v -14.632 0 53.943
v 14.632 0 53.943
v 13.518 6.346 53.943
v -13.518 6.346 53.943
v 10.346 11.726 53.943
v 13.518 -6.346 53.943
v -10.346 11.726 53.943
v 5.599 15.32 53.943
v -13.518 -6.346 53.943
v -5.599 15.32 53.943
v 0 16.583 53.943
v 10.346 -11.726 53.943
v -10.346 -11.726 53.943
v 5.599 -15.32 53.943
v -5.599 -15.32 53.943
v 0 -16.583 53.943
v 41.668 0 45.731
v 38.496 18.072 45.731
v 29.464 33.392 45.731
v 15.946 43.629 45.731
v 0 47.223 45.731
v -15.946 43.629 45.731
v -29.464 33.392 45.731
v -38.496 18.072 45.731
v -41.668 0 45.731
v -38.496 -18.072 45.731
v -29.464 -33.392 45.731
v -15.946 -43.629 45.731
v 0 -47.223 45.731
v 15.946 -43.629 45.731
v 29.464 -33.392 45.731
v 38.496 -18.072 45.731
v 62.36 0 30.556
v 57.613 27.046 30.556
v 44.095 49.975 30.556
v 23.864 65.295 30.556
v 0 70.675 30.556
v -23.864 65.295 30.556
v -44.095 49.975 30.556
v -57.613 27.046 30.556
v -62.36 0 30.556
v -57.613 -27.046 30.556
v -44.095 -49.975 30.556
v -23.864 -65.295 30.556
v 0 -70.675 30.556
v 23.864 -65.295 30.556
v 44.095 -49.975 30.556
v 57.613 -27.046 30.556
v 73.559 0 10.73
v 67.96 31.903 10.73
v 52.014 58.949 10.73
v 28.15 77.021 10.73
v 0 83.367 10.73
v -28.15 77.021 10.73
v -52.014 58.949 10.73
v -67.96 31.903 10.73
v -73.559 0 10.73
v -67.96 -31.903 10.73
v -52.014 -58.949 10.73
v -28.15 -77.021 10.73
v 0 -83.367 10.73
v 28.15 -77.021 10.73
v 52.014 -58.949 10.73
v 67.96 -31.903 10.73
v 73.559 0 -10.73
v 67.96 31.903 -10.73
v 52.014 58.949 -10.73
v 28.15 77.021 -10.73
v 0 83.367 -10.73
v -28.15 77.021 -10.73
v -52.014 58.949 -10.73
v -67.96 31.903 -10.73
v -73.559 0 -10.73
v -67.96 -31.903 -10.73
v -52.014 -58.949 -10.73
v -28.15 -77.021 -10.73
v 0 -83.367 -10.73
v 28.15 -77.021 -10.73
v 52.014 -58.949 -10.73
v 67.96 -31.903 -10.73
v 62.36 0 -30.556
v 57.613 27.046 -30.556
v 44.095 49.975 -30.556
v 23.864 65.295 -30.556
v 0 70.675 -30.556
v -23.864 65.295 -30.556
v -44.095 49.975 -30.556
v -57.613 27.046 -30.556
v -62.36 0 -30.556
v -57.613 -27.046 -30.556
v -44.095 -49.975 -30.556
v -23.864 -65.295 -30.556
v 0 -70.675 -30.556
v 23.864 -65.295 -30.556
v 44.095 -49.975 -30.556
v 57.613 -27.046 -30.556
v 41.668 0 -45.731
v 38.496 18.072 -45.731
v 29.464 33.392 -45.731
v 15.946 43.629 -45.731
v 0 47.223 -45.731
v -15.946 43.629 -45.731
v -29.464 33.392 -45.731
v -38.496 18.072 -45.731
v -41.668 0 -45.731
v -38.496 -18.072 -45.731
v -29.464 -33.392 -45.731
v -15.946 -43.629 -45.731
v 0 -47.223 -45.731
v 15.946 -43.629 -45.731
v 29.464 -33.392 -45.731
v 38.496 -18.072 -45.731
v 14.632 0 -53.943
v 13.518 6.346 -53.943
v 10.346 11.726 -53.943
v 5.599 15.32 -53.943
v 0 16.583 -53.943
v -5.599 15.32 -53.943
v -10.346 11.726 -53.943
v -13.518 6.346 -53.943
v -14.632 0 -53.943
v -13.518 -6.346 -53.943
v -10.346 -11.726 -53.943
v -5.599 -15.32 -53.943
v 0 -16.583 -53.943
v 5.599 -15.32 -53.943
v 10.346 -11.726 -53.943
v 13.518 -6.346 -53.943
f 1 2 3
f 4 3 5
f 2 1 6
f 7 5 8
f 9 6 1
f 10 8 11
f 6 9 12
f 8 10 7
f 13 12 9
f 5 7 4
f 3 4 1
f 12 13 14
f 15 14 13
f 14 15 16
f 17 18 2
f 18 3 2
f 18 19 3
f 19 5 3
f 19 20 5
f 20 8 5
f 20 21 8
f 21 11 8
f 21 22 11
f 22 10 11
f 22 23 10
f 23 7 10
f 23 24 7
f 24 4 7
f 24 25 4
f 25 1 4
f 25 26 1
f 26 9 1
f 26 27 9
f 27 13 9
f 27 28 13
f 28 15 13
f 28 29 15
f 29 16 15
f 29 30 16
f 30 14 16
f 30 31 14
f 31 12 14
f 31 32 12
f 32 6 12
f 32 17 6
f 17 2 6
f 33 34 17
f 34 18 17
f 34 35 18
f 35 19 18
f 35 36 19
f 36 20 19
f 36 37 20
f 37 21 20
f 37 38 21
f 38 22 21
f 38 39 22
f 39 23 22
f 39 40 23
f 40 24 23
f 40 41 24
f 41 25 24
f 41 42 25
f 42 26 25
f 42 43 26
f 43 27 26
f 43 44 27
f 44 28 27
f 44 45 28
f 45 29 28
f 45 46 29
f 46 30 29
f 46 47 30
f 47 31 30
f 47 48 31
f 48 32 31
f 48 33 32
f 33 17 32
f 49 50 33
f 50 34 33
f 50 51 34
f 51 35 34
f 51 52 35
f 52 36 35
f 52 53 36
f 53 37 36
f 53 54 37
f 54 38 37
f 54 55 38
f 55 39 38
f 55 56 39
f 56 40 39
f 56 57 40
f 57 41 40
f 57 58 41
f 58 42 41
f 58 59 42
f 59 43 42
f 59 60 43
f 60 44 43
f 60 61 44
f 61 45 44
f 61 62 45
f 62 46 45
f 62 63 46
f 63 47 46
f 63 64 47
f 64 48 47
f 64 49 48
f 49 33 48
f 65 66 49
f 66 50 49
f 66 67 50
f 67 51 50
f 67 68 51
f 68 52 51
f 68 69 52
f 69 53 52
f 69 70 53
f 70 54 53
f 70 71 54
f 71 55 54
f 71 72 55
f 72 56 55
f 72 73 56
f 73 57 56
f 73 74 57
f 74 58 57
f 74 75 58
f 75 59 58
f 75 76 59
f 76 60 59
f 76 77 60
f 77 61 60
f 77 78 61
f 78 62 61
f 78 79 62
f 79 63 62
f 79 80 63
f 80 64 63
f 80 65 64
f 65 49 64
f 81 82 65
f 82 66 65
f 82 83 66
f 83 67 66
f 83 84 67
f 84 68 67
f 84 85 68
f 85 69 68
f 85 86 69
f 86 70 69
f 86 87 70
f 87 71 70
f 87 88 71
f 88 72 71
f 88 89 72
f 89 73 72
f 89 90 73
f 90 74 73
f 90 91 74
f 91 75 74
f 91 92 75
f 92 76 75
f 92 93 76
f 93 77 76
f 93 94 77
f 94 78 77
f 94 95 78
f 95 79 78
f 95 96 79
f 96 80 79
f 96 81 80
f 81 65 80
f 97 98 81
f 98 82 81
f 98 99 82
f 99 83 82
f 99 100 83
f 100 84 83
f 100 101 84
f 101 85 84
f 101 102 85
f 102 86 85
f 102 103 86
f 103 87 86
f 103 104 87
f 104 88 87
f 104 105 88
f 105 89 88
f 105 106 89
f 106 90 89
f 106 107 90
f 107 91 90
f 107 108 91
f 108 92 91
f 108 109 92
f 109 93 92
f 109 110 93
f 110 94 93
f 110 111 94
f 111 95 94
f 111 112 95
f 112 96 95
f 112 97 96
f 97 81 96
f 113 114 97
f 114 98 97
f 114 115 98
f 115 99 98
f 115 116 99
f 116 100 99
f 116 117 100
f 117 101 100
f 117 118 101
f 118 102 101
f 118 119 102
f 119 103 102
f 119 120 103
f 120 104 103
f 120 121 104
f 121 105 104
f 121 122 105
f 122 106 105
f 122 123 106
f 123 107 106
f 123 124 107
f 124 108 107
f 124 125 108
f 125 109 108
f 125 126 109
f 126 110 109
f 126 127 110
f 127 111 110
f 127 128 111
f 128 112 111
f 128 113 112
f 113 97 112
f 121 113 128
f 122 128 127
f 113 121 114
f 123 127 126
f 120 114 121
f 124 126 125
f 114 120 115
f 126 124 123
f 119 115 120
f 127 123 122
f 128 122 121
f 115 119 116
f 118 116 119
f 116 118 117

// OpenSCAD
// Generated by SolidPython 1.0.1 on 2020-07-29 00:46:52


scale(v = [15, 17, 11]) {
	sphere(r = 5);
}
/***********************************************
*********      SolidPython code:      **********
************************************************
 
# import packages: SolidPython
from solid import *
from solid.utils import *
from itertools import chain, combinations, permutations


class Resize:

    def __init__(self, scad_file):
        self.scad_file = scad_file
        #self.scad_file = import_scad(scad_file)
        # cone/cylinder param:
        self.r1 = 0
        self.r2 = 0
        self.h = 0
        # rectangular prism param:
        self.w = 0
        self.l = 0
        # ellipse param:
        self.r = 0

    # import OpenScad code (file name corresponds to shape)


    # classify shape + parameters
    def assign(self, param1, param2, param3):
        if self.scad_file == 'cone.scad':
            self.r1 = param1
            self.r2 = param2
            self.h = param3
        elif self.scad_file == 'cylinder.scad':
            self.r1 = param1
            self.r2 = param2
            self.h = param3
        elif self.scad_file == 'rectangularPrism.scad':
            self.h = param1
            self.l = param2
            self.w = param3
        else:
            self.r = param1
            self.h = param2

    # resize parameters
    def iterate(self):
        x = range(3, 20, 2)
        i = 1
        if self.scad_file == 'cone.scad':
            tempList = list(permutations(x, 2))
            for temp in tempList:
                param1 = temp[0]
                param2 = temp[1]
                filepath = 'produced_scad_files/' + 'cone' + str(param1) + '_' + str(param2) + '_' + '.scad'
                scad_render_to_file(cylinder(h=param1, r1=param2, r2=0), filepath)

        elif self.scad_file == 'cylinder.scad':
            tempList = list(permutations(x, 3))
            for temp in tempList:
                param1 = temp[0]
                param2 = temp[1]
                filepath = 'produced_scad_files/' + 'cylinder' + str(param1) + '_' + str(param2) + '_' + '.scad'
                scad_render_to_file(cylinder(h=param1, r1=param2, r2=param2), filepath)

        elif self.scad_file == 'rectangularPrism.scad':
            tempList = list(permutations(x, 3))
            for temp in tempList:
                param1 = temp[0]
                param2 = temp[1]
                param3 = temp[2]
                filepath = 'produced_scad_files/' + 'rectangularPrism' + str(param1) + '_' + str(param2) + '_' + str(
                    param3) + '.scad'
                scad_render_to_file(cube(size=(param1, param2, param3)), filepath)

        elif self.scad_file == 'ellipse.scad':
            tempList = list(permutations(x, 4))
            for temp in tempList:
                param1 = temp[0]
                param2 = temp[1]
                param3 = temp[2]
                param4 = temp[3]
                filepath = 'produced_scad_files/' + 'ellipse' + str(param1) + '_' + str(param2) + '_' + str(param3) + '_' + str(param4) + '.scad'
                scad_render_to_file(scale([param1, param2, param3])(sphere(r=param4)), filepath)

    def render_to_scadfile(self):
        scad_render_to_file(scad, 'example.scad') 
 
************************************************/
